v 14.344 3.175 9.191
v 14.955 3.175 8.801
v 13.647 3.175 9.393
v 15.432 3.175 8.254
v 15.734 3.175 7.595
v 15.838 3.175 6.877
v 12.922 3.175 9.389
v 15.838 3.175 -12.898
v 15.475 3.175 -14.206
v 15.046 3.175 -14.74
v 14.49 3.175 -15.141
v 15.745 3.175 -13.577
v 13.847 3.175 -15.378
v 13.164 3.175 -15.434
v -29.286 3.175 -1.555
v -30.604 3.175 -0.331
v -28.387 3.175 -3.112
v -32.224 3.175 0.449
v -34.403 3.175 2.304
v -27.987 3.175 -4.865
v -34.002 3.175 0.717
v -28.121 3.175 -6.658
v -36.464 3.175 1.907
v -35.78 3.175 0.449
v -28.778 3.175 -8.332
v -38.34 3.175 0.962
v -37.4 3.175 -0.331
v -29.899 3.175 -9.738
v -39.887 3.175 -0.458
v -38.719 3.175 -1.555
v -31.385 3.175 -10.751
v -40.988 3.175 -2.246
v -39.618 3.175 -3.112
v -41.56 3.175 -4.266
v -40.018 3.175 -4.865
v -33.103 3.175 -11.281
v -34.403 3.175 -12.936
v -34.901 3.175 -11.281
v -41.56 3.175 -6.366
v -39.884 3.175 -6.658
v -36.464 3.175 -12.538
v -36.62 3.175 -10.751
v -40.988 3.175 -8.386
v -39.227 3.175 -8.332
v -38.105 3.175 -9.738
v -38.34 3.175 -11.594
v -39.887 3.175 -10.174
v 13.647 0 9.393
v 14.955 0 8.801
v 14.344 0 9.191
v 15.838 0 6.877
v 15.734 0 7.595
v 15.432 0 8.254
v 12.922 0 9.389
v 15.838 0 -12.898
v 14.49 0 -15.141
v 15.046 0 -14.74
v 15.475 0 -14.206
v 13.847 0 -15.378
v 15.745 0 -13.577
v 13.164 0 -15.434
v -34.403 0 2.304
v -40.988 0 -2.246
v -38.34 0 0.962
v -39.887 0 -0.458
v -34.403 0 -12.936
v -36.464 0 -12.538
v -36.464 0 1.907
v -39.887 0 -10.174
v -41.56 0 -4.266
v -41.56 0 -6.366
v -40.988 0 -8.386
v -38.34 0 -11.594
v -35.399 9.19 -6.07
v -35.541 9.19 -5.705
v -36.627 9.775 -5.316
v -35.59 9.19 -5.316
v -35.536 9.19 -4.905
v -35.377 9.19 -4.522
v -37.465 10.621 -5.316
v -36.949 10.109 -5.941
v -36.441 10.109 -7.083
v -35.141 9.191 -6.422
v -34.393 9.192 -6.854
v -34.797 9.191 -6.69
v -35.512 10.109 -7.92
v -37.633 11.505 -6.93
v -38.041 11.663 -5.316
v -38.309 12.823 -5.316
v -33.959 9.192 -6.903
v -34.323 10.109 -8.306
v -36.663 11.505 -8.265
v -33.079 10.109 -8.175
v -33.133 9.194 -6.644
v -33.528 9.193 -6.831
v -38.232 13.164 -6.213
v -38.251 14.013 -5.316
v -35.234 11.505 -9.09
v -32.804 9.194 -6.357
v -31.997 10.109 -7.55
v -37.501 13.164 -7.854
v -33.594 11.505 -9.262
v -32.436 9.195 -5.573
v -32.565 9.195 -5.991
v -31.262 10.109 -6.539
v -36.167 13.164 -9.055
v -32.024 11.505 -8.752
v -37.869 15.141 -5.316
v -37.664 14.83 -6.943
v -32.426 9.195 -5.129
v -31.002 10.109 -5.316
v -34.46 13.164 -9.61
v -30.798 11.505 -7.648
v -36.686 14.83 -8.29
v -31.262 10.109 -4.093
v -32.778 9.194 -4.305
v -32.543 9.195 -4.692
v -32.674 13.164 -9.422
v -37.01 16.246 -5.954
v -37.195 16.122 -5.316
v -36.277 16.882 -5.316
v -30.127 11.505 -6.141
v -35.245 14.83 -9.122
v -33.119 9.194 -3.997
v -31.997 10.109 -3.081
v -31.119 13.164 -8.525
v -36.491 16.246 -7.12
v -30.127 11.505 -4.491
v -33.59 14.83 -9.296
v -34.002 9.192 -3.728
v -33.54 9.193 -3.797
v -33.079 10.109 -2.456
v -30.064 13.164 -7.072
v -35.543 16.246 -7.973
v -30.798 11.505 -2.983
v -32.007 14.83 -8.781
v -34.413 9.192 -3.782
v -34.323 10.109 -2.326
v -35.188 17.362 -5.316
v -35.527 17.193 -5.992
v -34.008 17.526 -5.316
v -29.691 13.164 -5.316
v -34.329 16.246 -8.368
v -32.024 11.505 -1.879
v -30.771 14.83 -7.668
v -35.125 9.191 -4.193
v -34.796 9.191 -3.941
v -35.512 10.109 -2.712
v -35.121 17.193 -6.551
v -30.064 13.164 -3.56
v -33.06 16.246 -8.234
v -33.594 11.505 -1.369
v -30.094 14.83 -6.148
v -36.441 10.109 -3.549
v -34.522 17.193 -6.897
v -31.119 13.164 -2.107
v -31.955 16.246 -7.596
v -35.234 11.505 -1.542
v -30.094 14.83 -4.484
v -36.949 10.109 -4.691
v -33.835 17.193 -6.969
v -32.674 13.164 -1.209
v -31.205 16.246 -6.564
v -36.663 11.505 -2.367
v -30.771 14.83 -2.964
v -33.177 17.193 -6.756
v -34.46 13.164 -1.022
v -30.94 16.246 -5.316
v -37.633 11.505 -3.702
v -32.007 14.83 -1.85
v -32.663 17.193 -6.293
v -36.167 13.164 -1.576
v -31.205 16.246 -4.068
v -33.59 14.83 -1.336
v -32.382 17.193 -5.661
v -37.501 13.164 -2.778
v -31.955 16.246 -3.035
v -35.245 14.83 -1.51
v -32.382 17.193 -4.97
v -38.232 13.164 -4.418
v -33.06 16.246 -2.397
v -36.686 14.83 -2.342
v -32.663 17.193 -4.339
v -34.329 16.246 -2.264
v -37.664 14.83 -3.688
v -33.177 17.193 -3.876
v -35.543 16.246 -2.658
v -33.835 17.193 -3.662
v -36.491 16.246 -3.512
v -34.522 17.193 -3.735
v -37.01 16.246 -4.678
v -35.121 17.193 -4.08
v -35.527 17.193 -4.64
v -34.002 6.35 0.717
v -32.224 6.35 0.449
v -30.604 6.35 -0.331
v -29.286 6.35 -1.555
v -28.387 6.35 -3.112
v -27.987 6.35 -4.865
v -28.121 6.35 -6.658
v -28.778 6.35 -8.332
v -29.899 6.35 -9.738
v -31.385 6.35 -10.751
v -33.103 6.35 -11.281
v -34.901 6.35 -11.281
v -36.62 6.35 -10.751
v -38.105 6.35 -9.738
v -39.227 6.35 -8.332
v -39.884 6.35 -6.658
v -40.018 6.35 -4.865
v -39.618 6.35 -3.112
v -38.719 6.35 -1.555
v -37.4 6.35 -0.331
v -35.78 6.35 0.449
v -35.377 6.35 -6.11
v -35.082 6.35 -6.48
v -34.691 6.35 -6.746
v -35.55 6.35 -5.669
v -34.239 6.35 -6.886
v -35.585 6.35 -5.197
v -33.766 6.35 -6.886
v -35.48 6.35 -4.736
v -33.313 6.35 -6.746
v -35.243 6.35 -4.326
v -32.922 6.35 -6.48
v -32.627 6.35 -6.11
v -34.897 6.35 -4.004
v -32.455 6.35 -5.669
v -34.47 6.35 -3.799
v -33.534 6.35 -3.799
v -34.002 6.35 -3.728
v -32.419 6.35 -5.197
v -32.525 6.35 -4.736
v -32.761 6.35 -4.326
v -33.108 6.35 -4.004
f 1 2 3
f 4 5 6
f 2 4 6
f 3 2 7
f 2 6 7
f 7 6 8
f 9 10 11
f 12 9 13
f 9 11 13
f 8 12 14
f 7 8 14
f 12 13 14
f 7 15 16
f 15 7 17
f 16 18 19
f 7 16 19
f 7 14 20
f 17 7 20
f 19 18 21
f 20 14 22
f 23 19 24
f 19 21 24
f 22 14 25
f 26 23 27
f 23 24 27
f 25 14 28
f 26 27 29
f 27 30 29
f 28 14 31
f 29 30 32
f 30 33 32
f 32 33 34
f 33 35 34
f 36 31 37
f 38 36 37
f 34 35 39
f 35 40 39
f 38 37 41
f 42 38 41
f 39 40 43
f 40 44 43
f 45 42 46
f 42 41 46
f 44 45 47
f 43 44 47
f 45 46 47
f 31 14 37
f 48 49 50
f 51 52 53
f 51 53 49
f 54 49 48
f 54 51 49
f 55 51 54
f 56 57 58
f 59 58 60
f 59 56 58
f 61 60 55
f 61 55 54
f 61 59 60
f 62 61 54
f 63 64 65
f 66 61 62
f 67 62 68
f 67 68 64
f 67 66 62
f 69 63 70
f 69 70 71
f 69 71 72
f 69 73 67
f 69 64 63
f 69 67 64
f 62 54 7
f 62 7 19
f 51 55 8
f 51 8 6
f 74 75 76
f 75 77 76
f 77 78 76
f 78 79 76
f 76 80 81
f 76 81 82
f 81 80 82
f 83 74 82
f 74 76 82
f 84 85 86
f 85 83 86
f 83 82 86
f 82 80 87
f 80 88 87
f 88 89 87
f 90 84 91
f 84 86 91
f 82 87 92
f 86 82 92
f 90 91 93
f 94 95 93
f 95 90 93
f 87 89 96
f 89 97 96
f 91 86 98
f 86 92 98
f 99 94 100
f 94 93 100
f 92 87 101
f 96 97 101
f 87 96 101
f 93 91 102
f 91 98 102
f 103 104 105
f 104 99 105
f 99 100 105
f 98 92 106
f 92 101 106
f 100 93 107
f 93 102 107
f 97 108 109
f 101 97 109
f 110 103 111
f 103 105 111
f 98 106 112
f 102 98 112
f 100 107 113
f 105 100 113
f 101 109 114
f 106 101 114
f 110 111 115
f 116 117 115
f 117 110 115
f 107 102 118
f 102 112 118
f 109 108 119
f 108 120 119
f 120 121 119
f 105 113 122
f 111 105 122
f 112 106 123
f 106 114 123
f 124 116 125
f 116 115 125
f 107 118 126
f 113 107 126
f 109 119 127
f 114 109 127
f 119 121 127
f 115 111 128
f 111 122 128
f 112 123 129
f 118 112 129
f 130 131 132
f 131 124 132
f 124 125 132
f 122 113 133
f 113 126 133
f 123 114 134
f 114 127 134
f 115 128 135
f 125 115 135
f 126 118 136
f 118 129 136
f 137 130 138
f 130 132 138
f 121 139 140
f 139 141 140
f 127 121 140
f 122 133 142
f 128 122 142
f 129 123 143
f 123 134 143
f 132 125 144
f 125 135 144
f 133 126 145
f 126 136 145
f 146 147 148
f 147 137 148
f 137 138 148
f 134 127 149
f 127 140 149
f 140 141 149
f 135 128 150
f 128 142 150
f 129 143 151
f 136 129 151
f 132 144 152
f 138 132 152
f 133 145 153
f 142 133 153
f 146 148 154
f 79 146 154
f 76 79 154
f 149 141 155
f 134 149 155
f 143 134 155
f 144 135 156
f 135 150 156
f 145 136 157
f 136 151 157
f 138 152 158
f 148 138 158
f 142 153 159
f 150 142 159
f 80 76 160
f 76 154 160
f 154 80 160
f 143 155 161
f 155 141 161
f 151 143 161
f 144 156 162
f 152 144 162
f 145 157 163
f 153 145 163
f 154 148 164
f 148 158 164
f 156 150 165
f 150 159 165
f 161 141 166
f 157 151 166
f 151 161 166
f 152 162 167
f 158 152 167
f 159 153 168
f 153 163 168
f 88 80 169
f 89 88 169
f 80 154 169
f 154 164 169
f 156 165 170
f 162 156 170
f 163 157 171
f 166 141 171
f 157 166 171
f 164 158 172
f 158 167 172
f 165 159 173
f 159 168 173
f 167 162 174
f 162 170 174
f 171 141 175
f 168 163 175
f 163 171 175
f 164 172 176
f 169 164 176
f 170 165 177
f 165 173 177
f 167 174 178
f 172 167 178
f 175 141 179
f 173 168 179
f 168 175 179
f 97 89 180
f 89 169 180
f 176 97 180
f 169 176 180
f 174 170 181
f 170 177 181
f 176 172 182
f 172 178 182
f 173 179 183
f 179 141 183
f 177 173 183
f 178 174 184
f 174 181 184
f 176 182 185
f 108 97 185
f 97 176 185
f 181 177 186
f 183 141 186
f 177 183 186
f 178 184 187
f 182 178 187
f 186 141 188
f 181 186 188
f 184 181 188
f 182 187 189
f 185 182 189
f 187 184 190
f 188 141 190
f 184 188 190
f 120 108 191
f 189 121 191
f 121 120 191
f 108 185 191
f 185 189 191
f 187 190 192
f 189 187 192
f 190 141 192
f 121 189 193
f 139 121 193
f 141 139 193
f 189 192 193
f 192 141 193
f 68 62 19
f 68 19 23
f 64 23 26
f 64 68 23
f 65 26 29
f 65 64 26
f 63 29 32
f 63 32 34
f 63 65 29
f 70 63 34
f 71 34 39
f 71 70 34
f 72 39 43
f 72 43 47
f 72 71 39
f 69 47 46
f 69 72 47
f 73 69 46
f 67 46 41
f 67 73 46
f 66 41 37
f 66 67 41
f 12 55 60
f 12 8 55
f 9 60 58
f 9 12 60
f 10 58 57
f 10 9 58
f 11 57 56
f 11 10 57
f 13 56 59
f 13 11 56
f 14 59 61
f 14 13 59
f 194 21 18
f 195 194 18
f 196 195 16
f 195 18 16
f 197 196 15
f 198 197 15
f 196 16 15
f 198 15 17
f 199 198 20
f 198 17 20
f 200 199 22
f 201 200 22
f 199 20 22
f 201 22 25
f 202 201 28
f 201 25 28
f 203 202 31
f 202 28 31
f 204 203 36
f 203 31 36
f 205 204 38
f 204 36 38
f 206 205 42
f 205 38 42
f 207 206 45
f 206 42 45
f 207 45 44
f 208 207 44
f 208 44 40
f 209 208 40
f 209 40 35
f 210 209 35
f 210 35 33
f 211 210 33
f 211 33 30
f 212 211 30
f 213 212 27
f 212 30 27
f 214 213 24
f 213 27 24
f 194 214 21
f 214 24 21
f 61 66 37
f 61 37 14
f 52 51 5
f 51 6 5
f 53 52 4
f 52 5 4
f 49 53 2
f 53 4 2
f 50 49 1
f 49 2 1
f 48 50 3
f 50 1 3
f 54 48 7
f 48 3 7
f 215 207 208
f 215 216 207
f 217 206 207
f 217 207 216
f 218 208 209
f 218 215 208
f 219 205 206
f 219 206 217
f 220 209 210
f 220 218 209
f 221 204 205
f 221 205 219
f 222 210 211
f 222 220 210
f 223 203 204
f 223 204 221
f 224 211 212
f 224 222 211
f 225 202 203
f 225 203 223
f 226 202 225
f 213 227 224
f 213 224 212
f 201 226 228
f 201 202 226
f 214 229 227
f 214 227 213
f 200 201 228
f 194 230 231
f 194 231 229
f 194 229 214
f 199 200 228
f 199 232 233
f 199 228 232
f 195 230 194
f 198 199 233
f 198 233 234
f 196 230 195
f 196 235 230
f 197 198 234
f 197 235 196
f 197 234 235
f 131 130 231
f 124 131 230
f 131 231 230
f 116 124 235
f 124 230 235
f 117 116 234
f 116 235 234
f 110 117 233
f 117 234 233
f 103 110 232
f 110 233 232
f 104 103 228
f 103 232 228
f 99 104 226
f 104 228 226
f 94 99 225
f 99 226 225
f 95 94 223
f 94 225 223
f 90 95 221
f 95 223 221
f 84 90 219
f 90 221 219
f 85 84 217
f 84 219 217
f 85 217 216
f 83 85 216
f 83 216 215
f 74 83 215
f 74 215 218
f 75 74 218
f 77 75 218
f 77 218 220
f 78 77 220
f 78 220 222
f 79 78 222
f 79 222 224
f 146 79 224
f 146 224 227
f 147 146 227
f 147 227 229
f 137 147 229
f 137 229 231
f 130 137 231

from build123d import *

# Parameters (mm, degrees)
BOSS_EXTRUDE1_DEPTH = 3.175
FILLET1_R           = 2.54
SKETCH2_R           = 6.0325
BOSS_EXTRUDE3_DEPTH = 3.175
SKETCH3_R           = 1.5875
BOSS_EXTRUDE4_DEPTH = 3.175


with BuildPart() as part:
    # Sketch1 → Boss-Extrude1 (new body)
    with BuildSketch(Plane(origin=(0, 0, 0), x_dir=(1, 0, 0), z_dir=(0, 1, 0))):
        with BuildLine():
            Line((15.837639572, 15.574796876), (15.837639572, -9.825203124))
            Line((15.837639572, -9.825203124), (-34.402531646, -2.304219409))
            ThreePointArc((-34.402531646, -2.304219409), (-41.632773479, 5.315780591), (-34.402531646, 12.935780591))
            Line((-34.402531646, 12.935780591), (15.837639572, 15.574796876))
        make_face()
    extrude(amount=BOSS_EXTRUDE1_DEPTH)

    # Fillet1
    fillet1_edges = [part.edges().sort_by_distance(p)[0] for p in [
        (15.837639572, 1.5875, -15.574796876),
        (15.837639572, 1.5875, 9.825203124),
    ]]
    fillet(fillet1_edges, radius=FILLET1_R)

    # Sketch2 → Boss-Extrude3 (add)
    with BuildSketch(Plane(origin=(0, 3.175, 0), x_dir=(1, 0, 0), z_dir=(0, 1, 0))):
        with Locations(Location((-34.002268199, 5.315780591, 0), (0, 0, 270))):
            Circle(SKETCH2_R)
    extrude(amount=BOSS_EXTRUDE3_DEPTH)

    # Sketch3 → Boss-Extrude4 (add)
    with BuildSketch(Plane(origin=(0, 6.35, 0), x_dir=(1, 0, 0), z_dir=(0, 1, 0))):
        with Locations(Location((-34.002268199, 5.315780591, 0), (0, 0, 270))):
            Circle(SKETCH3_R)
    extrude(amount=BOSS_EXTRUDE4_DEPTH)

    # Sketch6 → Revolve1 (revolve)
    with BuildSketch(Plane.XY.offset(-5.315780591)):
        with BuildLine():
            Line((-34.008296726, 17.526), (-34.008296726, 8.89))
            ThreePointArc((-34.008296726, 8.89), (-38.326296726, 13.208), (-34.008296726, 17.526))
        make_face()
    revolve(axis=Axis((-34.008296726, 17.526, -5.315780591), (0, -1, 0)))


solid = part.part
